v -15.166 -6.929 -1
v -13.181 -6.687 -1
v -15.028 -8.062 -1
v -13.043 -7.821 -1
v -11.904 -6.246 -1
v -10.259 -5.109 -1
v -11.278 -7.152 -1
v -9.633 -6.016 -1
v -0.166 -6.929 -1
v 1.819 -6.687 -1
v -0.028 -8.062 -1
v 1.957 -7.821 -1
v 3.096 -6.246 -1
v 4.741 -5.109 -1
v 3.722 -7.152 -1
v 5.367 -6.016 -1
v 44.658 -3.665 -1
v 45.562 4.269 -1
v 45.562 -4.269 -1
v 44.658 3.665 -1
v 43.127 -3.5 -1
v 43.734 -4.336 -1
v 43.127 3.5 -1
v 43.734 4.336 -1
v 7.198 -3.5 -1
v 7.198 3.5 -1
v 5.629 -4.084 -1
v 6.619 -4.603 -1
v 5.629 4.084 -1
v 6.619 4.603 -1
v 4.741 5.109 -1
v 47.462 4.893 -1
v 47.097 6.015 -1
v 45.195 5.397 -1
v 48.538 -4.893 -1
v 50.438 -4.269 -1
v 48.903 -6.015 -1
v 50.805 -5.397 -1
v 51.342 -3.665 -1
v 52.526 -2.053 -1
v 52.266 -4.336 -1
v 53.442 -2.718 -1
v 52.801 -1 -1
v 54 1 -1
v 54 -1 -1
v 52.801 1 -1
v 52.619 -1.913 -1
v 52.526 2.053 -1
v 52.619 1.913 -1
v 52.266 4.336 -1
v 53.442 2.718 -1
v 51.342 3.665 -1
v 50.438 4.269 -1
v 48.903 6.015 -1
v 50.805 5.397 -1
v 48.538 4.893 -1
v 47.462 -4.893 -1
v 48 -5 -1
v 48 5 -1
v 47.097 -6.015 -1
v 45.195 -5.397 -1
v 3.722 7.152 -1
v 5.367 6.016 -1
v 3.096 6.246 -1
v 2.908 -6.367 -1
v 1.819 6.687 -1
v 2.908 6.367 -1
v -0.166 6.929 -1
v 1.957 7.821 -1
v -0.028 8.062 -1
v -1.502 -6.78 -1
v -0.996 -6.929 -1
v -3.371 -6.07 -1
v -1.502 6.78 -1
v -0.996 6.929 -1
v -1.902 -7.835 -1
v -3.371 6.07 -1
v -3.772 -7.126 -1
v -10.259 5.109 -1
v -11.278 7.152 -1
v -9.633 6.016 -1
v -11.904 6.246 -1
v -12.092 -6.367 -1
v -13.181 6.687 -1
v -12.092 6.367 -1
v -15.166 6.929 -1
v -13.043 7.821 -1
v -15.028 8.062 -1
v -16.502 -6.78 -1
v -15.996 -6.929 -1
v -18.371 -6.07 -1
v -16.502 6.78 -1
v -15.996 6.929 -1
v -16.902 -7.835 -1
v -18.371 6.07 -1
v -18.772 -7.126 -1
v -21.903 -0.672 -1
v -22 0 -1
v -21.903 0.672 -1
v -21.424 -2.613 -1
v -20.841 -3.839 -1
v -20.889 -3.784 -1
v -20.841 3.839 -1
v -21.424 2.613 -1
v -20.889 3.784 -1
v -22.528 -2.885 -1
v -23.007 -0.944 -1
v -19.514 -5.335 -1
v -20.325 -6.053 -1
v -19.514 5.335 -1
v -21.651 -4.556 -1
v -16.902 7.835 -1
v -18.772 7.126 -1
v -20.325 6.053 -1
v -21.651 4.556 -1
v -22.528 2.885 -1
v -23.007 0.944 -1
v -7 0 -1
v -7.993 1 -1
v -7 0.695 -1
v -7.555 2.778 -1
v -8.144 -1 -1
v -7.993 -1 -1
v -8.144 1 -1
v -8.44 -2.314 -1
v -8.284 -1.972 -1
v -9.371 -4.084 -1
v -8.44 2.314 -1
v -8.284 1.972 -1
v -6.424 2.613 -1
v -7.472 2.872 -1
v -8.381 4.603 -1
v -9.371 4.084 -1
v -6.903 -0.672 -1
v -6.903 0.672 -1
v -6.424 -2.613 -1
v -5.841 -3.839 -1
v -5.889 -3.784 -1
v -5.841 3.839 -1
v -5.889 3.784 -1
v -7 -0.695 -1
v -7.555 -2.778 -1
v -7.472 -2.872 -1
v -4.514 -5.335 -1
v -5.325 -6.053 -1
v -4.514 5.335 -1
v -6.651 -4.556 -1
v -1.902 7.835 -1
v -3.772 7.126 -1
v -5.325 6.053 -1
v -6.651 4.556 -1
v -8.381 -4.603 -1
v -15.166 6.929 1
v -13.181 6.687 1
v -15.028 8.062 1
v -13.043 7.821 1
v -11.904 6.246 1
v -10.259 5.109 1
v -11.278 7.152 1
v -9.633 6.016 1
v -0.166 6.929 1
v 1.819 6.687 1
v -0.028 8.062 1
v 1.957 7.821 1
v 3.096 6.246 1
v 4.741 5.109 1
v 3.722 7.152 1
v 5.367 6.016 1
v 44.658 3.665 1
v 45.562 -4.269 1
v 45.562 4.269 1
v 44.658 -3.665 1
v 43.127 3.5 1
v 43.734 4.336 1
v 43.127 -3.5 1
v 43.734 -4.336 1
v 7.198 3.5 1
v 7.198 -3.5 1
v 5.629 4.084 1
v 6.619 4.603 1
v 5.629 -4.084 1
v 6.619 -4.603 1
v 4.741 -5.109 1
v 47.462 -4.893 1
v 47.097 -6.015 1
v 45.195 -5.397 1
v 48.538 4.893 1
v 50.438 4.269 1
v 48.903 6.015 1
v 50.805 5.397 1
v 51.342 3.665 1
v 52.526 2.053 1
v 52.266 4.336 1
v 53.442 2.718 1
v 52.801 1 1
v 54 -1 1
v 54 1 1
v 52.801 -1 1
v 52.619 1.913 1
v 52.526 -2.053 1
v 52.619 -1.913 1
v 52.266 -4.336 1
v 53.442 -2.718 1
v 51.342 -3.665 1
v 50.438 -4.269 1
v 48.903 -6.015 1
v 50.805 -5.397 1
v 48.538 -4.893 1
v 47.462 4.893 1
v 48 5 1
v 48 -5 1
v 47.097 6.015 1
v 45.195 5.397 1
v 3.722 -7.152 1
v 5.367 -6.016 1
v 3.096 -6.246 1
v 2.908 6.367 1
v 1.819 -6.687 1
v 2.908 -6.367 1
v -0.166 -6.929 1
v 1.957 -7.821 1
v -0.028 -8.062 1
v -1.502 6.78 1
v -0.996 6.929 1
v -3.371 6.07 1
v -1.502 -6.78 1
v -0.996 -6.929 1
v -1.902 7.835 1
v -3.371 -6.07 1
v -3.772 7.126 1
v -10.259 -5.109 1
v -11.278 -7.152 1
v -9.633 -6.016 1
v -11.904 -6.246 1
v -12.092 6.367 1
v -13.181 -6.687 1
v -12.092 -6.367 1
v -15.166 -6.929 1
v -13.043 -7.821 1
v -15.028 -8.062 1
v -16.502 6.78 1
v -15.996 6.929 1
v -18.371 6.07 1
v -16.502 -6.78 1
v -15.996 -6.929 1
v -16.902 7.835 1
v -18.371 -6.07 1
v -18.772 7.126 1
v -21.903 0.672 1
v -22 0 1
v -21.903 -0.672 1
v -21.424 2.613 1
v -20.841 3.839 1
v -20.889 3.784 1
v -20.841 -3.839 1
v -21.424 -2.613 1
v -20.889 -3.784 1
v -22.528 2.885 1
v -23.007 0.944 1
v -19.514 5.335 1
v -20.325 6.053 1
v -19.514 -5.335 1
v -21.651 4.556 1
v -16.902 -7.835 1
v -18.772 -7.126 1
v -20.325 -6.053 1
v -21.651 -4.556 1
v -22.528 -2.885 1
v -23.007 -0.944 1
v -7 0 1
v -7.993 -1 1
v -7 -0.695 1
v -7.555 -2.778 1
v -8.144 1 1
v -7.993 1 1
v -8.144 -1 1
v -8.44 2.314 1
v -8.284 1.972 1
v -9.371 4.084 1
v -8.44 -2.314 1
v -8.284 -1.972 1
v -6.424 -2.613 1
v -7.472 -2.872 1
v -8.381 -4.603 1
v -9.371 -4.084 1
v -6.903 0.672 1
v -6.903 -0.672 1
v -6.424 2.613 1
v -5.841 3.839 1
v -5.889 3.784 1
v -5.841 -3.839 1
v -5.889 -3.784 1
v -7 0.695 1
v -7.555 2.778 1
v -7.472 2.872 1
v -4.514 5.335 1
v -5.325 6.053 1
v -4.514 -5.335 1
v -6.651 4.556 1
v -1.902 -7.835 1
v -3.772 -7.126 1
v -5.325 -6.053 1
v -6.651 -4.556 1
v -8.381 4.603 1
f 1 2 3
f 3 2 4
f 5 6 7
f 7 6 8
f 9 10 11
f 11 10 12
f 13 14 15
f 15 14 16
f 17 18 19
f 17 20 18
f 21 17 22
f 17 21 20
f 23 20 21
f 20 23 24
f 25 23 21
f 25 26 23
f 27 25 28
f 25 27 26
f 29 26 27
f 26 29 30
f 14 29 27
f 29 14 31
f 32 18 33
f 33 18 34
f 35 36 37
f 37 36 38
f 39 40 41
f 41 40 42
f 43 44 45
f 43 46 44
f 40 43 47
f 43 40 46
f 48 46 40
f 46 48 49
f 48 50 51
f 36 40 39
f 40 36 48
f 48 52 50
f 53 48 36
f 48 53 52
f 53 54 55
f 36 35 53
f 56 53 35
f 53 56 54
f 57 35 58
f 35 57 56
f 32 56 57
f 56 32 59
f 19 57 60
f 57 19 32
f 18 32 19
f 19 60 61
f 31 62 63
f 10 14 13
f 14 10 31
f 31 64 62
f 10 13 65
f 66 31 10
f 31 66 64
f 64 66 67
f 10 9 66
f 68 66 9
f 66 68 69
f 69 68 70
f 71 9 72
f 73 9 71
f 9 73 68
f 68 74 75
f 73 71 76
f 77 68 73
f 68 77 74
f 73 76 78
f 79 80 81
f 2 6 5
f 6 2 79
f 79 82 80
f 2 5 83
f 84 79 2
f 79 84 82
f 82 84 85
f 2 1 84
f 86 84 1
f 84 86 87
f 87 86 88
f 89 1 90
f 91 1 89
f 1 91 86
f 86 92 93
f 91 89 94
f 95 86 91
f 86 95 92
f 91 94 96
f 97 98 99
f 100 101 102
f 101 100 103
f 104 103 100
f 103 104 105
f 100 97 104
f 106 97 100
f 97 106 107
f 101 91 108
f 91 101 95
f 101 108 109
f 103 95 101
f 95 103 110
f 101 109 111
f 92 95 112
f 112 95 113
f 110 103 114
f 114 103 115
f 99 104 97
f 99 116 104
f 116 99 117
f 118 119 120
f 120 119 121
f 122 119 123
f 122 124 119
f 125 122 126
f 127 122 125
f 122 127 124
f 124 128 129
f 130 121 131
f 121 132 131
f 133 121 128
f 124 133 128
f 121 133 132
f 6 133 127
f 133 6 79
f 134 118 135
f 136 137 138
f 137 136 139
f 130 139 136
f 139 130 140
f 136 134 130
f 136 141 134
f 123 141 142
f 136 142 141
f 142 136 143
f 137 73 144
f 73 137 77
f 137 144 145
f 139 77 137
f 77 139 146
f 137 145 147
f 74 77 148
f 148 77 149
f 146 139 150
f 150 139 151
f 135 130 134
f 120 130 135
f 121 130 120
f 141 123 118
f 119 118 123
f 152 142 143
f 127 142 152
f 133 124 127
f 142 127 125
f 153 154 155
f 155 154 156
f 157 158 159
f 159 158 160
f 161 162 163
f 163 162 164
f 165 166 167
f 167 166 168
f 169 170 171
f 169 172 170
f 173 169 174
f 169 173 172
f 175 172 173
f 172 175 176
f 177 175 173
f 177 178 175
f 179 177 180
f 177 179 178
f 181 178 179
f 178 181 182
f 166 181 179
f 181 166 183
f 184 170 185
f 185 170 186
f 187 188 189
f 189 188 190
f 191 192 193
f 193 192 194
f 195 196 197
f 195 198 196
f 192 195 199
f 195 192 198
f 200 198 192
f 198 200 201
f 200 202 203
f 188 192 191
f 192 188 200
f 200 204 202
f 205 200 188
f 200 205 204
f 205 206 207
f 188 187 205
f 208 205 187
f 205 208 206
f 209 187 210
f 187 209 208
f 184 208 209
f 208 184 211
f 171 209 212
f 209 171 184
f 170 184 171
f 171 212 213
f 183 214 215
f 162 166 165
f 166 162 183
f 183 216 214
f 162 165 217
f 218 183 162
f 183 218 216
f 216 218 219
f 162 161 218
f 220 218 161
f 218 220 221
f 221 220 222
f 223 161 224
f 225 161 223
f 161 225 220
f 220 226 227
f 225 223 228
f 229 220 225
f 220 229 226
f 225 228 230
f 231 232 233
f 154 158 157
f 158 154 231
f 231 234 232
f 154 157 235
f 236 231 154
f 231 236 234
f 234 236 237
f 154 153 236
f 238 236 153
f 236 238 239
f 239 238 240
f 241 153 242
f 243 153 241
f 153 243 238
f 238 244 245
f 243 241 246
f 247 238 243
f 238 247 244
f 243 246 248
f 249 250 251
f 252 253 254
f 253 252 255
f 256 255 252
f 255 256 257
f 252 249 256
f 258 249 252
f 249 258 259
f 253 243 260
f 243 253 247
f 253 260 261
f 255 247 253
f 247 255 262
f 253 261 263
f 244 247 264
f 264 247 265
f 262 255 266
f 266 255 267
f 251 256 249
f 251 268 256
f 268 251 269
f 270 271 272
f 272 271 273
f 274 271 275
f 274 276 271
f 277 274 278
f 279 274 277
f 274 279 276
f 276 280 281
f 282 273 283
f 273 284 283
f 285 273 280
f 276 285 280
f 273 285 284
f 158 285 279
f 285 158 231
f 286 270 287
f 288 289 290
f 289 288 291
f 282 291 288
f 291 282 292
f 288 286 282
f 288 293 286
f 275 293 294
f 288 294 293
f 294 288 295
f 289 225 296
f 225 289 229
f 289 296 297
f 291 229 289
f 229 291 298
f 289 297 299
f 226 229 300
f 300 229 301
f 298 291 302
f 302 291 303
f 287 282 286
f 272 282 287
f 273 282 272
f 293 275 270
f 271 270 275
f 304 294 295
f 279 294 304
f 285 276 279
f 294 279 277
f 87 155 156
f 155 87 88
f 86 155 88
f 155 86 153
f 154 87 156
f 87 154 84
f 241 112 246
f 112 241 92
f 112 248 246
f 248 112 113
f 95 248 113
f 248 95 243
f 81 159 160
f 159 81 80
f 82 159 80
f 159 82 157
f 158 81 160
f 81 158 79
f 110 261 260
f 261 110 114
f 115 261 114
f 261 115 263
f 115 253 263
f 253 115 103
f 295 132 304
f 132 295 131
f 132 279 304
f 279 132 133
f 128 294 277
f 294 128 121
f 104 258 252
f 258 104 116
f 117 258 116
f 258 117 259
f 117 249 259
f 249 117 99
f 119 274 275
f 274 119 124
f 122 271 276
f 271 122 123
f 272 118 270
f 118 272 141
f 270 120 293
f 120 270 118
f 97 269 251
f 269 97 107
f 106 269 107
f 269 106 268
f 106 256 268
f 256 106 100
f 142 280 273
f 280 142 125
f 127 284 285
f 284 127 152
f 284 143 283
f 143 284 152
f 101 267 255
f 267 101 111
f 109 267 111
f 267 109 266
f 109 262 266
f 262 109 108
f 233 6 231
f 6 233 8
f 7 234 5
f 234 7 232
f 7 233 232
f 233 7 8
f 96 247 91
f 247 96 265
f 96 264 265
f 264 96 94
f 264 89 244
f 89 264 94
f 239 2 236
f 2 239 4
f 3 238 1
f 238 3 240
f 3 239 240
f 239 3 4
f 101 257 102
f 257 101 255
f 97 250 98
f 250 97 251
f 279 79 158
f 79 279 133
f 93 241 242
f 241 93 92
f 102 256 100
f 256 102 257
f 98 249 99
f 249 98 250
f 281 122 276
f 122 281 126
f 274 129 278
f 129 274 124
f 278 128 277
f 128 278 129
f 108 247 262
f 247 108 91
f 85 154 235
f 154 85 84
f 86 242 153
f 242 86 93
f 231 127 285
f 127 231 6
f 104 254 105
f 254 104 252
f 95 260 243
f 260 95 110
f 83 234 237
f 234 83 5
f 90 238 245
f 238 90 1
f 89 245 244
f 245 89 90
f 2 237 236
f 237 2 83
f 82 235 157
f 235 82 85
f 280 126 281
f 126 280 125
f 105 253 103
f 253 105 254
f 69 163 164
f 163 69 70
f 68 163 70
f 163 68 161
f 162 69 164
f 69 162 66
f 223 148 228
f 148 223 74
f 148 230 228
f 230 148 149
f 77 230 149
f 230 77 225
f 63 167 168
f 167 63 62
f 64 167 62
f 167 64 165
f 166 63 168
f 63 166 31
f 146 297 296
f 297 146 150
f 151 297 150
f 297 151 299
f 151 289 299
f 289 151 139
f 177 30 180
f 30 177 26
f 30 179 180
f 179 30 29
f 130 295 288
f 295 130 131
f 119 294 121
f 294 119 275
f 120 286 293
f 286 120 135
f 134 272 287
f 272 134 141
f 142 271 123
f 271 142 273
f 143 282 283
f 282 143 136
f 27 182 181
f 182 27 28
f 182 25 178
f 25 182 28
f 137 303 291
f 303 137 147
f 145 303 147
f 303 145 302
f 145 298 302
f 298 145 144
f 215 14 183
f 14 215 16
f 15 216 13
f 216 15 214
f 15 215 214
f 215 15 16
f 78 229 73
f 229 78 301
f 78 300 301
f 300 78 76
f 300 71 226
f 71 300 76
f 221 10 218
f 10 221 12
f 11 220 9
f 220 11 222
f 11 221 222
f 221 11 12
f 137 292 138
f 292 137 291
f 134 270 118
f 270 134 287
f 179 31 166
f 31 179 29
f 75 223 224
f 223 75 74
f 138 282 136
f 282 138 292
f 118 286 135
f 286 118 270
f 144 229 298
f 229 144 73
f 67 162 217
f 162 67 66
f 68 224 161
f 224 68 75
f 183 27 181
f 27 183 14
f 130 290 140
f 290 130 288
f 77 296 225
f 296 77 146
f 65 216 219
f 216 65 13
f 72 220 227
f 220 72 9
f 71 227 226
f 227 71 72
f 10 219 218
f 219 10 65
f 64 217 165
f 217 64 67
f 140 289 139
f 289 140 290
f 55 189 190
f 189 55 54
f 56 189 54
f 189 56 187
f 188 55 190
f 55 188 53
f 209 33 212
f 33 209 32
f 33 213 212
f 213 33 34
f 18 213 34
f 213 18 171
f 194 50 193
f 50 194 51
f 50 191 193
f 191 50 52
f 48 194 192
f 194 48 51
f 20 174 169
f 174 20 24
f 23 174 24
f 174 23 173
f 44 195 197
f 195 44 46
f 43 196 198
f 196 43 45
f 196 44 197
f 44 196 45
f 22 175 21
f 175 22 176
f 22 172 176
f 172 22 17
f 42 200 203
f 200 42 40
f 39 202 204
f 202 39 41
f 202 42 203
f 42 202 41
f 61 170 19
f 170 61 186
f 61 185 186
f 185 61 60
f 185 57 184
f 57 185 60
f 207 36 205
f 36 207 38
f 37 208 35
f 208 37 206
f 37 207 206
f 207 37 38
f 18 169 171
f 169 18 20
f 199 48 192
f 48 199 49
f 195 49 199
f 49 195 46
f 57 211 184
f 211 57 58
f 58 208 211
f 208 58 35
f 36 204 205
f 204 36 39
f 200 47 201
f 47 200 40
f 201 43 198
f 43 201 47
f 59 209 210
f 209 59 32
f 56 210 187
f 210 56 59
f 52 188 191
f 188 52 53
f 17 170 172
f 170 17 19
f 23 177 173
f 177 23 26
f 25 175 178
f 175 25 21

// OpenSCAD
module Gear(depth, radius_top, radius_bottom, cog_n, tw)
{
	cog_angle = atan(abs(radius_bottom-radius_top)/depth);
	//echo(cog_angle);
	
	mult = (radius_top == radius_bottom) ? 1 : 2;
	cog_pos = (radius_bottom < radius_top ? radius_bottom : radius_top)*mult;
	cog_len = sqrt(pow(radius_top-radius_bottom, 2)+pow(depth, 2));

	linear_extrude(height=depth, center=true, twist=tw)
	for(angle = [0:360/cog_n:360])
	{
		rotate([0,0,angle])
		translate([cog_pos,0,-(depth/2)])
		//rotate([0,-cog_angle,0])
		//cube([2,2,cog_len], center=true);
		square(2, center=true);
	}

	cylinder(depth,radius_bottom,radius_top, center=true);
}

module Box(width, height, depth, th)
{
	difference()
	{
		cube([width, height,depth], center=true);

		translate([0,0,(th/2)+0.1])
		cube([width-(2*th), height-(2*th), depth-th], center=true);
	}
}

module GearPole(len, wid, height, r_l, r_r, cn_l, cn_r)
{
	// iner cube
	cube_len = len - (r_l + r_r);
	cube([cube_len, wid, height], center=true);
	// left gear
	translate([-(cube_len/2),0,0])
	Gear(height, r_l, r_l, cn_l);
	// right gear
	translate([(cube_len/2),0,0])
	Gear(height, r_r, r_r, cn_r);
}

a = $t*360;
go_up = true;

angle = a;
if(go_up == true && a > 90)
{
	angle = -1*a;
	go_up = false;
}
if(go_up == false && a <= 270)
{
	angle = -1*a;
	go_up = true;
}

translate([-15,0,0])
rotate([0,0,-angle])
color("Red")Gear(2,7,7,13);

rotate([0,0,angle])
translate([30-6,0,0])
color("Green")GearPole(60, 7,2,7,5,13,10);

//rotate([0,0,$t*360])color("Blue")Gear(30,20,20,25,-100);
//translate([31,0,0])rotate([0,0,-$t*360])color("Green")Gear(30,10,10,15,100);


/*
// input
translate([31,0,0])rotate([0,0,-($t*2)*360])color("Blue")Gear(3,10,10,15);

// second set
translate([0,0,3])rotate([0,0,$t*360])color("Salmon")Gear(3,10,10,15);
rotate([0,0,$t*360])color("Red")Gear(3,20,20,30);

// third set
translate([-31,0,3])rotate([0,0,-($t/2)*360])color("Green")Gear(3,20,20,30);
translate([-31,0,20])rotate([0,0,-($t/2)*360])color("DarkGreen")Gear(3,10,10,15);
translate([-31,0,12])rotate([0,0,-($t/2)*360])color("Green")cylinder(20,2,2,center=true);

// radial gear set
translate([-21,0,31.5])rotate([0,90,0])rotate([0,0,-10-($t/2)*360])color("Yellow")Gear(3,10,10,15);
*/

/*
translate([31,0,0])rotate([0,0,-($t*2)*360])color("Blue")Gear(3,10,10,15);

//rotate([0,0,$t*360])translate([0,0,8])cube([3,3,20], center=true);
rotate([0,0,$t*360])color("Red")Gear(3,20,20,30);

%translate([10,0,0])Box(70,45,10,1);
translate([10,0,5])cube([70,45,1], center=true);
*/
